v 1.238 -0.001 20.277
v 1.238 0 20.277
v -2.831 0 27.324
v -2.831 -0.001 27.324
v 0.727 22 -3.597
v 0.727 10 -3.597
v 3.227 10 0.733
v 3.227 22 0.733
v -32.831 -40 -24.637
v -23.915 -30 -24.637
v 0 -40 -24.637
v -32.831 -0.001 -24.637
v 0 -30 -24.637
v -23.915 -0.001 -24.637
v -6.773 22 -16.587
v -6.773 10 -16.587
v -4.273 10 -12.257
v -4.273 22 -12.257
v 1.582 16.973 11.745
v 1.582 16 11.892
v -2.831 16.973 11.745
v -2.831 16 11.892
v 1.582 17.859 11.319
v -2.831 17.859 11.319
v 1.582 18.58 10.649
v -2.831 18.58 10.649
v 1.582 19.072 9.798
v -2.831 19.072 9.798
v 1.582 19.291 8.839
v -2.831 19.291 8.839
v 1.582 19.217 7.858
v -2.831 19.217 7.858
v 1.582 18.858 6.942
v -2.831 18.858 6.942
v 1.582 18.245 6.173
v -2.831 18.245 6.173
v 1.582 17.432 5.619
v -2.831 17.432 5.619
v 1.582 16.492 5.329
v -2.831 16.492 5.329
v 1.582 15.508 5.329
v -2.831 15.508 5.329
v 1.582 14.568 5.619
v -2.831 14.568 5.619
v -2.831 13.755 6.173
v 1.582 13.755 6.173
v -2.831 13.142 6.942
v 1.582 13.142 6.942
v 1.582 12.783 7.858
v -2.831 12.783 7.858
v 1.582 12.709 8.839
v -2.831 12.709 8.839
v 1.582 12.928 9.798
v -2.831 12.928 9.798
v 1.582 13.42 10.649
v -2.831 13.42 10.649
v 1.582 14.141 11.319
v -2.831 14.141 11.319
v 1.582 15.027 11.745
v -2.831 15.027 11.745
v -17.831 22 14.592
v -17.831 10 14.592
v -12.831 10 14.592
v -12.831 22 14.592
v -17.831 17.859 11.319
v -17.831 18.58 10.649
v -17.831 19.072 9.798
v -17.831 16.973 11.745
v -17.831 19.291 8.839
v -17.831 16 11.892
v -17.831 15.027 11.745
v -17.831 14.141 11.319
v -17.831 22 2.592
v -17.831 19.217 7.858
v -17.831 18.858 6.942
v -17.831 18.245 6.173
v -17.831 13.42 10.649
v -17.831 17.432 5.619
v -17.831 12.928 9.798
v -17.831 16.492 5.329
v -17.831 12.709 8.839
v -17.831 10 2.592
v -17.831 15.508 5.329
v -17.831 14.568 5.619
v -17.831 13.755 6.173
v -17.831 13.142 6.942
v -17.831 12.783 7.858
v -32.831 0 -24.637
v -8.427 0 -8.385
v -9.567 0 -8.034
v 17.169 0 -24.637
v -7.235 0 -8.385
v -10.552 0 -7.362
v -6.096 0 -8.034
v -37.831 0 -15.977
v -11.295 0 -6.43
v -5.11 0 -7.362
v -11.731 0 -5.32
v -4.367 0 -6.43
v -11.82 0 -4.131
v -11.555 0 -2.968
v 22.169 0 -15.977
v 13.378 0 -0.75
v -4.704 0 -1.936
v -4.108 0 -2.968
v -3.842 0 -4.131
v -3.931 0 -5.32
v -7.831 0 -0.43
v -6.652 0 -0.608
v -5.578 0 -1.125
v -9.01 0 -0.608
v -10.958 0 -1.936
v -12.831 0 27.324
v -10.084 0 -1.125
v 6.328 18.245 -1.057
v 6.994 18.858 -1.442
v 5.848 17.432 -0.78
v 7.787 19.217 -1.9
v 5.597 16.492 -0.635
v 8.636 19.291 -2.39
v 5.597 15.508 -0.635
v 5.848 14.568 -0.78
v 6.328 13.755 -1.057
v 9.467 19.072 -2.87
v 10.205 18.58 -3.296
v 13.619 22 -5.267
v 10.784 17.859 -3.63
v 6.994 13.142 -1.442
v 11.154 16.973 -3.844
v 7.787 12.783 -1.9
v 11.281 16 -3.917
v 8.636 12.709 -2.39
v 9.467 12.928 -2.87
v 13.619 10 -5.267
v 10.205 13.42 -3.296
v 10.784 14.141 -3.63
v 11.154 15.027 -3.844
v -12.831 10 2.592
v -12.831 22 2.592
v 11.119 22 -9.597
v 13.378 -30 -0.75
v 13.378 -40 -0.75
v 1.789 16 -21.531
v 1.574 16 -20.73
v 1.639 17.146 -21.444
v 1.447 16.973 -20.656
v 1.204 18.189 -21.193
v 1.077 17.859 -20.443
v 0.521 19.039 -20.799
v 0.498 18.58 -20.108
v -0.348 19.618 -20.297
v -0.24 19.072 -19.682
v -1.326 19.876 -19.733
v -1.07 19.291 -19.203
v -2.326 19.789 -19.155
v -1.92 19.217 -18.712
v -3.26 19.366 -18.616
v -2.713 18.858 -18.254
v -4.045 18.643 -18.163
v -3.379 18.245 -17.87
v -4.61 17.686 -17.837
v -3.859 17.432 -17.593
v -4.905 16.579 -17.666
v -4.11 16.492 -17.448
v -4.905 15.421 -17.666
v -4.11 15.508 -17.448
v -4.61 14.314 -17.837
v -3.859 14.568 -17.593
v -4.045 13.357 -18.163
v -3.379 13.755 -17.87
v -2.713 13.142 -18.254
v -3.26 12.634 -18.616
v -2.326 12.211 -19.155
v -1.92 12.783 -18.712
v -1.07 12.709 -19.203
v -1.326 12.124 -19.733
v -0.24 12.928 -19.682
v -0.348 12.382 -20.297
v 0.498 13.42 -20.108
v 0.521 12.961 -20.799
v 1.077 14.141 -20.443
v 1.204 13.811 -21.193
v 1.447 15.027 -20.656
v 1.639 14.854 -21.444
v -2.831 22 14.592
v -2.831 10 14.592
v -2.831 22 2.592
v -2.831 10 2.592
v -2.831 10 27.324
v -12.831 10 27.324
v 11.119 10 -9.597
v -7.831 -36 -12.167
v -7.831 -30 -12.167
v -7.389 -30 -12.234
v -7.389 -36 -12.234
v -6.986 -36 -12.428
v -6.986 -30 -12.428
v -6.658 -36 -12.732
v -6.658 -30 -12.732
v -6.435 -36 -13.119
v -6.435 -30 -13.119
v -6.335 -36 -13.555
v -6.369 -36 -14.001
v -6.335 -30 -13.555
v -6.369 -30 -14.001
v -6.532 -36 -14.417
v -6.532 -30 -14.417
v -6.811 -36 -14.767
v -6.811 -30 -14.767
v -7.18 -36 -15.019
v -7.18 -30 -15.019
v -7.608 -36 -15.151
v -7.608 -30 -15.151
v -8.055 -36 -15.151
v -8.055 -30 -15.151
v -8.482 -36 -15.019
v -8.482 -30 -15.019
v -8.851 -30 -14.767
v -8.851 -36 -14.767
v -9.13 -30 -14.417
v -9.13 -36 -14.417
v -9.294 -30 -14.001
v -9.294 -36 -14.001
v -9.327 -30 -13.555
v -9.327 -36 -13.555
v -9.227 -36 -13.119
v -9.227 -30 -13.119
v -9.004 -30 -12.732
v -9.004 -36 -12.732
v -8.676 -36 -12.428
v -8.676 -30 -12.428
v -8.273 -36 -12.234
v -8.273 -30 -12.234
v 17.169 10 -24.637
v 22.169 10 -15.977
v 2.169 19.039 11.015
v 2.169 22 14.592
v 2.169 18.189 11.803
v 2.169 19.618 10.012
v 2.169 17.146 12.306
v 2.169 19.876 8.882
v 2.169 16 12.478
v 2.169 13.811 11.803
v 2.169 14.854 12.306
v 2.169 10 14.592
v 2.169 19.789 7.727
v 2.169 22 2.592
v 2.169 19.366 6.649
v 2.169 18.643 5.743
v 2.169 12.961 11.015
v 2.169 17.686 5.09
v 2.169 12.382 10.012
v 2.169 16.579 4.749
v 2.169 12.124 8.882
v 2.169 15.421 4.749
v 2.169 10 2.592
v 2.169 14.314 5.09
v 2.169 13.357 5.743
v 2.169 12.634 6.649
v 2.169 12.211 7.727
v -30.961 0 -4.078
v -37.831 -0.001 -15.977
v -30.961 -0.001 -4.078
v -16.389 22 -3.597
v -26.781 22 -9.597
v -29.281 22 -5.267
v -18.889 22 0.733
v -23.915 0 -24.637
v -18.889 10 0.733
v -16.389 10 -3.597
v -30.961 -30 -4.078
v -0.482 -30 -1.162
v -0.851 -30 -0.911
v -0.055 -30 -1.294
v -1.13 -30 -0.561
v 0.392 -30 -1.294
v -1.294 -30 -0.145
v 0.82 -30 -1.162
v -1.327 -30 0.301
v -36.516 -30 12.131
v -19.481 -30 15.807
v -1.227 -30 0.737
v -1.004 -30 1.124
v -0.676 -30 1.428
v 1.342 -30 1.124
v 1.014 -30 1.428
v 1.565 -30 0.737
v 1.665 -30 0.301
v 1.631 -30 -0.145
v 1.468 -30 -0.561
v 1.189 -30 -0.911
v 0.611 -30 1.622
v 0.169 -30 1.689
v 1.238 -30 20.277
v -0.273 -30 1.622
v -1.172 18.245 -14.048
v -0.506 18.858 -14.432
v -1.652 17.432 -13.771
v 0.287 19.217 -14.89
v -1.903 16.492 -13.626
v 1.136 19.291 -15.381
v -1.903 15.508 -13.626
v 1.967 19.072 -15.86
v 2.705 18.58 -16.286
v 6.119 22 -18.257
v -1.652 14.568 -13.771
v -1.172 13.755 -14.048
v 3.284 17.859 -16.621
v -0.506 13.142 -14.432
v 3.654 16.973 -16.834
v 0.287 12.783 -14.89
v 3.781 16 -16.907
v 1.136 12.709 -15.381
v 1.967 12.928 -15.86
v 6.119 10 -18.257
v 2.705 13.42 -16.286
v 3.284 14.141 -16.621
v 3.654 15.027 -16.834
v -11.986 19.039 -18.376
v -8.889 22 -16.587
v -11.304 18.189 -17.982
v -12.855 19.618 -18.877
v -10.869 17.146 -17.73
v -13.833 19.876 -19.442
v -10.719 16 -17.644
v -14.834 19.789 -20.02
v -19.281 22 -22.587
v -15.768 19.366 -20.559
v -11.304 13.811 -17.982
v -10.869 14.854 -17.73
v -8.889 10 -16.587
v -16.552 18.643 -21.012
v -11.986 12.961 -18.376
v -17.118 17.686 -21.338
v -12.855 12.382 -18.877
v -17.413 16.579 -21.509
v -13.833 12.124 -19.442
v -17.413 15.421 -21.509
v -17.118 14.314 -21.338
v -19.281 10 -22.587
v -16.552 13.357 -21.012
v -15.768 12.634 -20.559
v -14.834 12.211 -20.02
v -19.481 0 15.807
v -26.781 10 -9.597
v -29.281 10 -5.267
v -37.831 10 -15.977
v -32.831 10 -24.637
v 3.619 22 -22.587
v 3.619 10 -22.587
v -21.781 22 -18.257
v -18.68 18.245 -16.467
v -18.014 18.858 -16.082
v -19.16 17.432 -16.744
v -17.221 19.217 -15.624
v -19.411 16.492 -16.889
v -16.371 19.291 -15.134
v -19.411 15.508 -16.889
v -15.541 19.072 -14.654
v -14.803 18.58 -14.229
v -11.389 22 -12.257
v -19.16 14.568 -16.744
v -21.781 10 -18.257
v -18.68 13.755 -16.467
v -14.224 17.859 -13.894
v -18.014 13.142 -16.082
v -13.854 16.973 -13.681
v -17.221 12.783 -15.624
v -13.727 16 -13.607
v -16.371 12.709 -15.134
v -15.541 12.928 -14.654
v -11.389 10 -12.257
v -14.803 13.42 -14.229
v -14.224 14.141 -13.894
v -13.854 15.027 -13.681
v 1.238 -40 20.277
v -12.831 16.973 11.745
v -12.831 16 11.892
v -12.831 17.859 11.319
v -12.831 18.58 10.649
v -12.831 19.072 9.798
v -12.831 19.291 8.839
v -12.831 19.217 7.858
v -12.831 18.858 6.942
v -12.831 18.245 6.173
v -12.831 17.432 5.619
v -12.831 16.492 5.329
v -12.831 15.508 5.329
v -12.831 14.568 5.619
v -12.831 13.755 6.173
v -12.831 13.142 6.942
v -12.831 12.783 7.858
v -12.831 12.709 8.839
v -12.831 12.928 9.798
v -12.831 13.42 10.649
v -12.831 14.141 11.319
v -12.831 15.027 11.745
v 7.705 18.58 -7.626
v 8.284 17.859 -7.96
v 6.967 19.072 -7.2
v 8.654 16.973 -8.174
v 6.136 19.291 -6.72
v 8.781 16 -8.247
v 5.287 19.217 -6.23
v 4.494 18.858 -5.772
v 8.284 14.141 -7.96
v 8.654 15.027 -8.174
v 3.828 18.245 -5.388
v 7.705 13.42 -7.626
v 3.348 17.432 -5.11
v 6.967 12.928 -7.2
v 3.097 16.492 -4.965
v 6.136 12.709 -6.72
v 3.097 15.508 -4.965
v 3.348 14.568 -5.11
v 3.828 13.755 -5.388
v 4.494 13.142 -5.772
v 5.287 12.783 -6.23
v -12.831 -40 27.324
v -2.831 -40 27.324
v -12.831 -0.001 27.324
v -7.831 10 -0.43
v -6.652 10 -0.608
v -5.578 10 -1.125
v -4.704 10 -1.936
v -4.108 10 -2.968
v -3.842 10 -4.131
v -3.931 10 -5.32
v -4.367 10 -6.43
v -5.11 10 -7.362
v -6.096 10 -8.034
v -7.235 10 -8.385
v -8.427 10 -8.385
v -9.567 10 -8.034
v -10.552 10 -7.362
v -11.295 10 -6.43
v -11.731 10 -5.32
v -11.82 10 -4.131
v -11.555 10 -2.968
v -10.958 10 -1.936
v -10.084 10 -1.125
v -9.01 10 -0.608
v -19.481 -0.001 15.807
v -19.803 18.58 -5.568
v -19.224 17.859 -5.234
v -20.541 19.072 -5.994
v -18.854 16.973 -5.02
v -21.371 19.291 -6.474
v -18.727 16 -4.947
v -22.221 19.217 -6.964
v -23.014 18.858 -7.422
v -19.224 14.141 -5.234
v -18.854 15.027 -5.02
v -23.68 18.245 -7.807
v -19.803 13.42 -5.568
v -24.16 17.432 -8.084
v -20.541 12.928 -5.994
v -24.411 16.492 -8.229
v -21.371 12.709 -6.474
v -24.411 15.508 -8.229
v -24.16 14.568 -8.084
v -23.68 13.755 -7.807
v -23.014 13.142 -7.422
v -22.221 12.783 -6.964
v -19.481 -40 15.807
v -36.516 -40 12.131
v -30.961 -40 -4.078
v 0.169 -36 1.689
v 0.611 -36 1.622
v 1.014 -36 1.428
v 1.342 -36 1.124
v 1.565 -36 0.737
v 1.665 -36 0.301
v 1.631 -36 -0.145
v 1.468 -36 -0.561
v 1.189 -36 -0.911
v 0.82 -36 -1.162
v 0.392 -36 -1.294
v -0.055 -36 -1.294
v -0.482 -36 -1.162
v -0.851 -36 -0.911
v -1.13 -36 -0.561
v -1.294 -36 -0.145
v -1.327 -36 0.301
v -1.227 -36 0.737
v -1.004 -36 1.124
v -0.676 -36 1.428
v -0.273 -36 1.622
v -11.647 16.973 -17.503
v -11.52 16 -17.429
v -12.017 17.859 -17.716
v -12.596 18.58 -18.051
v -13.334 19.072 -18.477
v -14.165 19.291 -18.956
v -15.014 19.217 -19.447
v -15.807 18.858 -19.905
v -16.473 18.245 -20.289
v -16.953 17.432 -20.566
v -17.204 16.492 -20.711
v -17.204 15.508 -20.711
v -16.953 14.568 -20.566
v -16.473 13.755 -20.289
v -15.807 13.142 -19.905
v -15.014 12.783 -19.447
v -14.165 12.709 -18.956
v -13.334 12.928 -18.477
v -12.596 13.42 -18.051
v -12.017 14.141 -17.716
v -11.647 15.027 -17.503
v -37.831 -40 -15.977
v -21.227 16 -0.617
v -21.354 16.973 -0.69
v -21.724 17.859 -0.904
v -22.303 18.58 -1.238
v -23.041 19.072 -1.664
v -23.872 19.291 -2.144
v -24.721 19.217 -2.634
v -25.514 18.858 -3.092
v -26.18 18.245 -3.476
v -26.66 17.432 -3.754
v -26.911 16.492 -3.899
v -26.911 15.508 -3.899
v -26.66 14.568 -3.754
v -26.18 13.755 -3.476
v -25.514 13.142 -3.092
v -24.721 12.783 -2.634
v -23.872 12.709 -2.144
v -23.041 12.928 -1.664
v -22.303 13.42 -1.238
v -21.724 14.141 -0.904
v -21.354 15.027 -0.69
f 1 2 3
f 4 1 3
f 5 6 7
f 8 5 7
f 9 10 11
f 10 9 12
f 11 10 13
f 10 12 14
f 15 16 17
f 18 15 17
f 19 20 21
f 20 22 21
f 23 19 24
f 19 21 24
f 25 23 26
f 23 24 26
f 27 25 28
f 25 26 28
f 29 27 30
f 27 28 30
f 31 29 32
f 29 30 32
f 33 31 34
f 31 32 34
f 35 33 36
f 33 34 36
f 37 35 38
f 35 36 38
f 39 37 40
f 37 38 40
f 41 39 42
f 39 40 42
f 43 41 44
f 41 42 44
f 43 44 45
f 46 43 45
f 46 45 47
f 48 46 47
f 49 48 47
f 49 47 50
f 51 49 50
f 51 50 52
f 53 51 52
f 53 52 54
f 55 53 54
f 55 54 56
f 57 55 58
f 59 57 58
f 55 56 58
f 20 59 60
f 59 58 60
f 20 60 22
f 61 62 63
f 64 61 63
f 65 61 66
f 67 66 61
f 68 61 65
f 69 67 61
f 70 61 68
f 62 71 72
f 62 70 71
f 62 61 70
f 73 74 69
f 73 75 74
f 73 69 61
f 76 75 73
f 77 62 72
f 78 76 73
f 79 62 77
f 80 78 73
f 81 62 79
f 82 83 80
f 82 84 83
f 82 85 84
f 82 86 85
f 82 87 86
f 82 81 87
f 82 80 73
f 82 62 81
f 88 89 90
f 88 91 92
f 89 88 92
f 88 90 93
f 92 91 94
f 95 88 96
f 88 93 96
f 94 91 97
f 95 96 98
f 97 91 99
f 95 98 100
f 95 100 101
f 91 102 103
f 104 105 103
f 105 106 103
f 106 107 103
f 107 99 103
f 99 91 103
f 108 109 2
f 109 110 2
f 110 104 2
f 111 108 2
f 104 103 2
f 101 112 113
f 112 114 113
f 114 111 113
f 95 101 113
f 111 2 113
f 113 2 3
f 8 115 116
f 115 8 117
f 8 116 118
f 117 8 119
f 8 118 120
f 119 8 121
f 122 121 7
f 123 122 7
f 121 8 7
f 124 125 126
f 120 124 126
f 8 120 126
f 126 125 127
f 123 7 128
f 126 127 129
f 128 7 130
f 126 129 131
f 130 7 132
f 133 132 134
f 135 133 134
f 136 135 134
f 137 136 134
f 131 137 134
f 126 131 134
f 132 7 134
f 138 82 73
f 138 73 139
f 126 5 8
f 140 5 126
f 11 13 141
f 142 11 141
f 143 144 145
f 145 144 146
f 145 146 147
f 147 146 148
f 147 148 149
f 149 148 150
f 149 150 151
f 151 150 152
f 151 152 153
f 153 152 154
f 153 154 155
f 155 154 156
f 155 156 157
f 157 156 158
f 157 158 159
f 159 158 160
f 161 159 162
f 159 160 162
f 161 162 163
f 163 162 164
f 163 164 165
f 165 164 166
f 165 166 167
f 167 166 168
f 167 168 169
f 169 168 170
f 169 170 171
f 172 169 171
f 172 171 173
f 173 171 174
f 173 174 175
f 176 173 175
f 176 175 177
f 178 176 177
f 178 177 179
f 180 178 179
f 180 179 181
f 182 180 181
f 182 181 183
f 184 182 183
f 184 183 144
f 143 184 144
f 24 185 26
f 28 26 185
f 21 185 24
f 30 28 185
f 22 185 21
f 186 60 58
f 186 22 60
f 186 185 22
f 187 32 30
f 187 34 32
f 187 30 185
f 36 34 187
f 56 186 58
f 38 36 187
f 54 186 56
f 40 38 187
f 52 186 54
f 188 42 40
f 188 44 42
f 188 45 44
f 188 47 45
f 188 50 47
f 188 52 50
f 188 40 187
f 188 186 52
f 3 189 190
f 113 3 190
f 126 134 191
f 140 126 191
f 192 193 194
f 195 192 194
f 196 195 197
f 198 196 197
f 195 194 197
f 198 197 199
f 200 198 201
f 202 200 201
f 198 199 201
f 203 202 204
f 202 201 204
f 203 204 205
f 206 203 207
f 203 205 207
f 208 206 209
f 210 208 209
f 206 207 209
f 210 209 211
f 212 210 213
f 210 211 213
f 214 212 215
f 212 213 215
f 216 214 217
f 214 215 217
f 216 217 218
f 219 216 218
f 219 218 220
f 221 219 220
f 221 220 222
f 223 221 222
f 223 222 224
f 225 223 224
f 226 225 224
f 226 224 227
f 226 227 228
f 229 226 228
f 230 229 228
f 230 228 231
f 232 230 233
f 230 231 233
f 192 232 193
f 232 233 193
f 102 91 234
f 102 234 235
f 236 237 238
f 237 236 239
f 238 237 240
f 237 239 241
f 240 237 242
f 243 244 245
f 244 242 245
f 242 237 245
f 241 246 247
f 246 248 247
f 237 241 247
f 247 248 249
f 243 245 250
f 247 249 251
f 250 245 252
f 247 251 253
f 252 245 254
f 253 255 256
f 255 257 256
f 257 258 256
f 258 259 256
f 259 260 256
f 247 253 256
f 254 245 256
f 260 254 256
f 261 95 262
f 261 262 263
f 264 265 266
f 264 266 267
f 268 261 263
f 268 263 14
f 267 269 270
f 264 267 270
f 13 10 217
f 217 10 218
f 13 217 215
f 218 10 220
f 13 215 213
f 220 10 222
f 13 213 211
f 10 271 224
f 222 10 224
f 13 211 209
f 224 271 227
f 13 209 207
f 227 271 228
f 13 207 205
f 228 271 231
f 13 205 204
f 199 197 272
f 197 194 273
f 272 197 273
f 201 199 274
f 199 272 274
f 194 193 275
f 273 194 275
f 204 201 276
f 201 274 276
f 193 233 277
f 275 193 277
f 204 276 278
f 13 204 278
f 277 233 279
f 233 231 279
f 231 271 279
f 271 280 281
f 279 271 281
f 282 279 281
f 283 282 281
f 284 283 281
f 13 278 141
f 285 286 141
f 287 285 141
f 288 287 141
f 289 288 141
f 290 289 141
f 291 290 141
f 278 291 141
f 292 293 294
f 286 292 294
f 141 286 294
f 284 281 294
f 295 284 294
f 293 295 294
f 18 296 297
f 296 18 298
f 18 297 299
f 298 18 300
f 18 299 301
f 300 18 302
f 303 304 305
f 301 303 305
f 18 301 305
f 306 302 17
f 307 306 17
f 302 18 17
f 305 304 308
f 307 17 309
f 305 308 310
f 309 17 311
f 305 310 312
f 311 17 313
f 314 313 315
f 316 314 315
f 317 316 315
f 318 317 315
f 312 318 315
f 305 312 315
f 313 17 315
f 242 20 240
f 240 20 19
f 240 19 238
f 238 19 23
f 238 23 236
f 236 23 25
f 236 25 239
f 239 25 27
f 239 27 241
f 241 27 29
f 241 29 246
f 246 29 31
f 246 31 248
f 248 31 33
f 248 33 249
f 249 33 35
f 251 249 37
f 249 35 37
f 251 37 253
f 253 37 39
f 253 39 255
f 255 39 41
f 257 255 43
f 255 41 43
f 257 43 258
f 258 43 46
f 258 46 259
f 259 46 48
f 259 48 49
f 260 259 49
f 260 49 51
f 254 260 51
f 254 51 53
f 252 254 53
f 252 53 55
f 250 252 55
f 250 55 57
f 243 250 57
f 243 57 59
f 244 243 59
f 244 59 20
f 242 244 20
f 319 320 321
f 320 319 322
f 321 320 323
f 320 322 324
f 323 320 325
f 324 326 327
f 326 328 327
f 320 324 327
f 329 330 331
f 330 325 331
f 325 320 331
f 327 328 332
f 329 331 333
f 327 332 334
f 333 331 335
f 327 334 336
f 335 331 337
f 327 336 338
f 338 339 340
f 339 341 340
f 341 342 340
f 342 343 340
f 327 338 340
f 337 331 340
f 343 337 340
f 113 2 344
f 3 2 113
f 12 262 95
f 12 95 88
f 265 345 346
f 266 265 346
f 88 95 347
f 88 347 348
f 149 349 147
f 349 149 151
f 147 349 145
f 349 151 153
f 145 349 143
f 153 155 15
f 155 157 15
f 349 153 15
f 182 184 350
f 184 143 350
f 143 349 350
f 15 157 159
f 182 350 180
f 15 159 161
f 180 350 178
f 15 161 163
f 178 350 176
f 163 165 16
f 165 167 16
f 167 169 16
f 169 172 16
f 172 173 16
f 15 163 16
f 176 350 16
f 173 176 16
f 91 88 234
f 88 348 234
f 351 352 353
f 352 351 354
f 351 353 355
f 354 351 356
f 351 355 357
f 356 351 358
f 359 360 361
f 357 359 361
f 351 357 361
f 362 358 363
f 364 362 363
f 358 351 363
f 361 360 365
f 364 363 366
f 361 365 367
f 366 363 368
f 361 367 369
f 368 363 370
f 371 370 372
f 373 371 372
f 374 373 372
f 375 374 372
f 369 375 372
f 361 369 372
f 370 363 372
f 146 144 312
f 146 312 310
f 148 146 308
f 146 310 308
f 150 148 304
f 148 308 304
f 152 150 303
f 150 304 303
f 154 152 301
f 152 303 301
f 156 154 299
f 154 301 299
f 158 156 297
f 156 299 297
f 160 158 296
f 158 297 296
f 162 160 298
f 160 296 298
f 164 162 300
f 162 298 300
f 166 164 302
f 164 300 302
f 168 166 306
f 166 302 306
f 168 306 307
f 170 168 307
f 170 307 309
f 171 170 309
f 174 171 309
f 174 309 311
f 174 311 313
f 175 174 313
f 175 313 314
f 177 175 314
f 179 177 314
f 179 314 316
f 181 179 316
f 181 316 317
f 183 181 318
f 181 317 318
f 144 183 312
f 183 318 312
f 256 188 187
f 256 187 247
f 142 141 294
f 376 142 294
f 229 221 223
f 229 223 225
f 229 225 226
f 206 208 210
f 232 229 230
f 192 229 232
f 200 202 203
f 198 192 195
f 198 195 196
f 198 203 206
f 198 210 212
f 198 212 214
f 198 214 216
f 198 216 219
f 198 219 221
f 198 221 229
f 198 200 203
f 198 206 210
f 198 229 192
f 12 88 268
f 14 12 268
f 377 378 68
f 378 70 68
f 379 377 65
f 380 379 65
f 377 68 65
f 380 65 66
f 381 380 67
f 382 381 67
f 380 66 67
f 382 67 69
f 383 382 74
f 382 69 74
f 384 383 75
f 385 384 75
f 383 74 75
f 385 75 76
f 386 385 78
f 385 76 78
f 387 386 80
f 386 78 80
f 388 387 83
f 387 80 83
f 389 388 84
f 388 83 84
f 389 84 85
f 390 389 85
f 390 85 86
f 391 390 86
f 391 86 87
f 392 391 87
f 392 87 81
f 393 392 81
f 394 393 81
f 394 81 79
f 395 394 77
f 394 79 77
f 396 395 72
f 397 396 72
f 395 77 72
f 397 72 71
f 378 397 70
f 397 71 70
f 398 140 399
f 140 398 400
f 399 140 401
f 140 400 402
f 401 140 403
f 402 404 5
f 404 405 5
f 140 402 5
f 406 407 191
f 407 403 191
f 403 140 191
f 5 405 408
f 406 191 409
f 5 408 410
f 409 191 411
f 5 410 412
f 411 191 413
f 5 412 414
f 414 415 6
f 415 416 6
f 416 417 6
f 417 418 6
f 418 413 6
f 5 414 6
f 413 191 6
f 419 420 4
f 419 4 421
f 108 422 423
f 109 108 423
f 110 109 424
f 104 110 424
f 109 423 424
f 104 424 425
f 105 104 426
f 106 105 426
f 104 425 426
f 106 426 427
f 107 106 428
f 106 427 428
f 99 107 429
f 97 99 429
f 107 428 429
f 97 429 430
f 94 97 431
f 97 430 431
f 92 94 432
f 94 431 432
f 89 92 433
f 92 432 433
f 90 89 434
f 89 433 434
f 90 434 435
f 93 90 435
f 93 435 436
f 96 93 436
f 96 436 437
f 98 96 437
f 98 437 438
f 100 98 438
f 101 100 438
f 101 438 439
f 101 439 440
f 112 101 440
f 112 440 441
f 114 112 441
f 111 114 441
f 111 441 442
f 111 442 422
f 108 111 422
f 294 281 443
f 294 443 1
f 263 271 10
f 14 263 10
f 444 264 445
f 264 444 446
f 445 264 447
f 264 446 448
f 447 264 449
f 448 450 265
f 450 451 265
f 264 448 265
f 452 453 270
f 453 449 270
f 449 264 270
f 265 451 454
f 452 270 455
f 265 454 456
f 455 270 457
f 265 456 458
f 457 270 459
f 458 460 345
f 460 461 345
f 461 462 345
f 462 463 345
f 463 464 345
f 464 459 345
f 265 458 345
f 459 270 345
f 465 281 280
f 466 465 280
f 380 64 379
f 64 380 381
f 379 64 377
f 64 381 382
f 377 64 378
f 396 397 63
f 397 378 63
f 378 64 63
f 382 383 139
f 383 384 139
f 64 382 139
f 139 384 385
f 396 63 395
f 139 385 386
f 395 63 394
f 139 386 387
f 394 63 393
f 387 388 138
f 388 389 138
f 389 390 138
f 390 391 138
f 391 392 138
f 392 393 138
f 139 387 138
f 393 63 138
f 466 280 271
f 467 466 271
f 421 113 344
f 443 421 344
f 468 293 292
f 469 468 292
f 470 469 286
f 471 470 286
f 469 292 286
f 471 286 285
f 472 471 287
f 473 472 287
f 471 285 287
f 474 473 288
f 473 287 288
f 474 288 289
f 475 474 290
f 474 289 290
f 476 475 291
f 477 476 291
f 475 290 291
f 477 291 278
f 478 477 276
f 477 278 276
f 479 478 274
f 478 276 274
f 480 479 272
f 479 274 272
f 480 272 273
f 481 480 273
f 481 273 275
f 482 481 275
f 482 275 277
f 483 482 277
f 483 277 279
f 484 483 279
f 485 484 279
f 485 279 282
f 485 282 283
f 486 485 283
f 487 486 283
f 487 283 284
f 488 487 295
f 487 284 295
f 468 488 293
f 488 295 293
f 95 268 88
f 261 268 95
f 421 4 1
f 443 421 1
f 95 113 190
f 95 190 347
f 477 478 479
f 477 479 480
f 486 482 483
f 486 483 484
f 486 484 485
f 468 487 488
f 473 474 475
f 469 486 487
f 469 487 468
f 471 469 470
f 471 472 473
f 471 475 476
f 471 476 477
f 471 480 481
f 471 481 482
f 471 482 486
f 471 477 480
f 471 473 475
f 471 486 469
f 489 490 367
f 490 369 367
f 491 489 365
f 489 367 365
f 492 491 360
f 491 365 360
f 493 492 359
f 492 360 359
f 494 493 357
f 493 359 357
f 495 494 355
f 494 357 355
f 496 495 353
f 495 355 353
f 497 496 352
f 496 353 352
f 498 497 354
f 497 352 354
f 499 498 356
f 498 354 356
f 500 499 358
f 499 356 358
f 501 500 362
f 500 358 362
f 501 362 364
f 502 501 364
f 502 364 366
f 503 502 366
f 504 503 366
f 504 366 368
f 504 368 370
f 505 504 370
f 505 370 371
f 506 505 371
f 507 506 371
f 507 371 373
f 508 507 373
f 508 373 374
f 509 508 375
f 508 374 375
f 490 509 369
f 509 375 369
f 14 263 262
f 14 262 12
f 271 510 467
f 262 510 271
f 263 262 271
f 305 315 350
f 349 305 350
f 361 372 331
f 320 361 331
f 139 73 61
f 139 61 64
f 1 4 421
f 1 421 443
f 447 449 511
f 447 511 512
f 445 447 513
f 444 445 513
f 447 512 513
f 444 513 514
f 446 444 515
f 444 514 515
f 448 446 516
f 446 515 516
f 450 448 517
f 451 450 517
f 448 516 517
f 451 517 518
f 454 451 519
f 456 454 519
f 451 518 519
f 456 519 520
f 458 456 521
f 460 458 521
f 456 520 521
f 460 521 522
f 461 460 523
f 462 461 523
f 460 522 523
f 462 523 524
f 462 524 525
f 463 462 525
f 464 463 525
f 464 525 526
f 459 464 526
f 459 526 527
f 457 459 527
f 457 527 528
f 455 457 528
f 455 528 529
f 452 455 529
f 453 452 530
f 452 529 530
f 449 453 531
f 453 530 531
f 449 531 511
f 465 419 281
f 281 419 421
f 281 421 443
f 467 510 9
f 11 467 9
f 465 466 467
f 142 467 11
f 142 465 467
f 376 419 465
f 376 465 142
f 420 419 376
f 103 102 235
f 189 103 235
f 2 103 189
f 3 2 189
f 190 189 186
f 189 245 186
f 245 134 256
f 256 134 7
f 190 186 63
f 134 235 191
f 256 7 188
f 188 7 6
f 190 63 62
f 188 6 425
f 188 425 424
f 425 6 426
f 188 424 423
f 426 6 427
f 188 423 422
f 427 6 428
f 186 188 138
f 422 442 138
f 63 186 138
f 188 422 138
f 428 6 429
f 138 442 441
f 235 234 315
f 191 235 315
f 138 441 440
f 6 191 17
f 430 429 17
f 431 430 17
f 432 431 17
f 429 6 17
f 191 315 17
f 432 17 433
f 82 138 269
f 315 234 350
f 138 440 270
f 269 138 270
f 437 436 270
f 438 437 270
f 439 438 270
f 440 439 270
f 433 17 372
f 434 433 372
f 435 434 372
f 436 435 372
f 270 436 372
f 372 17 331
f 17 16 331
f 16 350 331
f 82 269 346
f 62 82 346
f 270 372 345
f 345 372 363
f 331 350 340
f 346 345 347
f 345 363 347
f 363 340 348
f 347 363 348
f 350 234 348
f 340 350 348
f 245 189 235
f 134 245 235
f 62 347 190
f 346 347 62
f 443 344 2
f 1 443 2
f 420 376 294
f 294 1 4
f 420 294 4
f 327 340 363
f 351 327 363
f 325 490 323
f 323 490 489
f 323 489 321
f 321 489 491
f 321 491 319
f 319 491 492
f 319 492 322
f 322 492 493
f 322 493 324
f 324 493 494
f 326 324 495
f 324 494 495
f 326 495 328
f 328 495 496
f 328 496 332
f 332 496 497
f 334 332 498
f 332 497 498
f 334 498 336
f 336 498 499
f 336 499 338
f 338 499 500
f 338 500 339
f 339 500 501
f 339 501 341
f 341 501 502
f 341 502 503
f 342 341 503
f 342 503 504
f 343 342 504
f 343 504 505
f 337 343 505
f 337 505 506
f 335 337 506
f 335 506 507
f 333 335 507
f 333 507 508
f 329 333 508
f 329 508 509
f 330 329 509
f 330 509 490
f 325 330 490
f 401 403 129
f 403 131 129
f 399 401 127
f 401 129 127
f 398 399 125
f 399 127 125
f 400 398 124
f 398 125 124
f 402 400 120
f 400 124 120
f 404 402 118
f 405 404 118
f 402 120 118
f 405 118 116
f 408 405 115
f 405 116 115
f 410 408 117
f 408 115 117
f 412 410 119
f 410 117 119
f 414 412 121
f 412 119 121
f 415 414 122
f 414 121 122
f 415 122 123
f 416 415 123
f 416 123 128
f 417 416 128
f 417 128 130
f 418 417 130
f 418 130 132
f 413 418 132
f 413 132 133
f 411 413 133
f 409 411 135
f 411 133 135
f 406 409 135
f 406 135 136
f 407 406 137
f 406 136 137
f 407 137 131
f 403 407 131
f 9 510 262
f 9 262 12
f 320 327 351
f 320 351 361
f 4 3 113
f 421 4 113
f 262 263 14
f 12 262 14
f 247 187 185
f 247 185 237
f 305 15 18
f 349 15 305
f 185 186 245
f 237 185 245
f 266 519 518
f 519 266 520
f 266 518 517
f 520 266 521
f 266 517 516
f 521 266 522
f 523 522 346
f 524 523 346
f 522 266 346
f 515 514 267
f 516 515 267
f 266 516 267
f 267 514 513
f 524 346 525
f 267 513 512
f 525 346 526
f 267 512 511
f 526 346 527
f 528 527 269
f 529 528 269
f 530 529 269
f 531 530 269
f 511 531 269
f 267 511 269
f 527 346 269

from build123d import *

# Parameters (mm, degrees)
EXTRUDE_1_DEPTH                 = 10
SKETCH_2_W                      = 5
SKETCH_2_H                      = 12
EXTRUDE_4_DEPTH                 = 12
HOLE_WIZARD_G1_16_1_D           = 6.6
HOLE_WIZARD_G1_16_1_DEPTH       = 50
HOLE_WIZARD_G1_16_1_CSINK_D     = 7.773
HOLE_WIZARD_G1_16_1_CSINK_ANGLE = 90
HOLE_WIZARD_G1_16_1_TIP         = 1.982840043
HOLE_WIZARD_G1_16_2_D           = 6.6
HOLE_WIZARD_G1_16_2_DEPTH       = 50
HOLE_WIZARD_G1_16_2_CSINK_D     = 7.773
HOLE_WIZARD_G1_16_2_CSINK_ANGLE = 90
HOLE_WIZARD_G1_16_2_TIP         = 1.982840043
HOLE_WIZARD_G1_16_3_D           = 6.6
HOLE_WIZARD_G1_16_3_DEPTH       = 50
HOLE_WIZARD_G1_16_3_CSINK_D     = 7.773
HOLE_WIZARD_G1_16_3_CSINK_ANGLE = 90
HOLE_WIZARD_G1_16_3_TIP         = 1.982840043
EXTRUDE_5_DEPTH                 = 40
SKETCH_19_W                     = 50
SKETCH_19_H                     = 30
CUT_EXTRUDE_2_DEPTH             = 74
EXTRUDE_6_DEPTH                 = 40
SKETCH_23_R                     = 1.5
CUT_EXTRUDE_3_DEPTH             = 6
SKETCH_24_R                     = 4
CUT_EXTRUDE_4_DEPTH             = 14
SPLIT_BODIES_1_SURFACE_1_BACK   = 101.717
SPLIT_BODIES_1_SURFACE_1_DEPTH  = 203.434
SPLIT_BODIES_1_SURFACE_2_BACK   = 101.717
SPLIT_BODIES_1_SURFACE_2_DEPTH  = 203.434


with BuildPart() as part:
    # 草图1 → 凸台-拉伸1 (new body)
    with BuildSketch(Plane(origin=(0, 0, 0), x_dir=(1, 0, 0), z_dir=(0, 1, 0))):
        Polygon((-32.831152269, 24.637065757), (17.168847731, 24.637065757), (22.168847731, 15.976811719), (-2.831152269, -27.32445847), (-12.831152269, -27.32445847), (-37.831152269, 15.976811719), align=None)
    extrude(amount=EXTRUDE_1_DEPTH)

    # 草图2 → 凸台-拉伸4 (add)
    with BuildSketch(Plane(origin=(0, 10, 0), x_dir=(1, 0, 0), z_dir=(0, 1, 0))):
        Polygon((-18.888926711, -0.733069557), (-16.388914662, 3.597050504), (-26.78120281, 9.597079424), (-29.28121486, 5.266959362), align=None)
        Polygon((-11.388890562, 12.257290628), (-8.888878512, 16.58741069), (-19.28116666, 22.58743961), (-21.78117871, 18.257319548), align=None)
        Polygon((-4.273413977, 12.257290628), (6.118874171, 18.257319548), (3.618862121, 22.58743961), (-6.773426027, 16.58741069), align=None)
        Polygon((3.226622172, -0.733069557), (13.618910321, 5.266959362), (11.118898271, 9.597079424), (0.726610123, 3.597050504), align=None)
        with Locations((-0.331152269, -8.591935763)):
            Rectangle(SKETCH_2_W, SKETCH_2_H)
        with Locations((-15.331152269, -8.591935763)):
            Rectangle(SKETCH_2_W, SKETCH_2_H)
    extrude(amount=EXTRUDE_4_DEPTH)

    # G1/16 螺纹孔1
    with Locations(Plane(origin=(4.96034155, 0, -8.591508373), x_dir=(-0.8660240123793532, 0, -0.500002409976558), z_dir=(0.500002409976558, 0, -0.8660240123793532))):
        with Locations((21.991727555, 16)):
            CounterSinkHole(HOLE_WIZARD_G1_16_1_D / 2, HOLE_WIZARD_G1_16_1_CSINK_D / 2, depth=HOLE_WIZARD_G1_16_1_DEPTH, counter_sink_angle=HOLE_WIZARD_G1_16_1_CSINK_ANGLE)
            with Locations((0, 0, -(HOLE_WIZARD_G1_16_1_DEPTH + HOLE_WIZARD_G1_16_1_TIP / 2))):  # 118° drill point
                Cone(0, HOLE_WIZARD_G1_16_1_D / 2, HOLE_WIZARD_G1_16_1_TIP, mode=Mode.SUBTRACT)

    # G1/16 螺纹孔2
    with Locations(Plane(origin=(-8.875955431, 0, -15.373506972), x_dir=(-0.8660240123793504, 0, 0.5000024099765628), z_dir=(-0.5000024099765628, 0, -0.8660240123793506))):
        with Locations((-8.427795735, 16)):
            CounterSinkHole(HOLE_WIZARD_G1_16_2_D / 2, HOLE_WIZARD_G1_16_2_CSINK_D / 2, depth=HOLE_WIZARD_G1_16_2_DEPTH, counter_sink_angle=HOLE_WIZARD_G1_16_2_CSINK_ANGLE)
            with Locations((0, 0, -(HOLE_WIZARD_G1_16_2_DEPTH + HOLE_WIZARD_G1_16_2_TIP / 2))):  # 118° drill point
                Cone(0, HOLE_WIZARD_G1_16_2_D / 2, HOLE_WIZARD_G1_16_2_TIP, mode=Mode.SUBTRACT)

    # G1/16 螺纹孔3
    with Locations(Plane(origin=(2.168847731, 0, 0), x_dir=(0, 0, -1), z_dir=(1, 0, 0))):
        with Locations((-8.591935763, 16)):
            CounterSinkHole(HOLE_WIZARD_G1_16_3_D / 2, HOLE_WIZARD_G1_16_3_CSINK_D / 2, depth=HOLE_WIZARD_G1_16_3_DEPTH, counter_sink_angle=HOLE_WIZARD_G1_16_3_CSINK_ANGLE)
            with Locations((0, 0, -(HOLE_WIZARD_G1_16_3_DEPTH + HOLE_WIZARD_G1_16_3_TIP / 2))):  # 118° drill point
                Cone(0, HOLE_WIZARD_G1_16_3_D / 2, HOLE_WIZARD_G1_16_3_TIP, mode=Mode.SUBTRACT)

    # 草图18 → 凸台-拉伸5 (add)
    with BuildSketch(Plane(origin=(0, 0, 0), x_dir=(-1, 0, 0), z_dir=(0, -1, 0))):
        Polygon((36.516059441, -12.131432542), (30.961139109, 4.077599876), (19.480871434, -15.806807021), align=None)
        Polygon((30.961139109, 4.077599876), (23.915302437, 24.637065757), (-1.237762159, -20.276891949), (19.480871434, -15.806807021), align=None)
        Polygon((23.915302437, 24.637065757), (0, 24.637065757), (-13.377530598, 0.749803781), (-1.237762159, -20.276891949), align=None)
    extrude(amount=EXTRUDE_5_DEPTH)

    # 草图19 → 切除-拉伸2 (cut)
    with BuildSketch(Plane(origin=(-4.125141126, 0, 19.119835281), x_dir=(0.9775078175150543, 0, 0.21089918609837094), z_dir=(-0.21089918609837097, 0, 0.9775078175150544))):
        with Locations((-8.136224319, -15)):
            Rectangle(SKETCH_19_W, SKETCH_19_H)
    extrude(amount=-CUT_EXTRUDE_2_DEPTH, mode=Mode.SUBTRACT)


with BuildPart() as cut_extrude_2_piece_1:
    # of the separate pieces the step leaves, piece 1, a body of its own (cut_extrude_2_pieces)
    add(part.part.solids().sort_by_distance((17.168847731, 0, -24.637065757))[0])



with BuildPart() as cut_extrude_2_piece_2:
    # of the separate pieces the step leaves, piece 2, a body of its own (cut_extrude_2_pieces)
    add(part.part.solids().sort_by_distance((-23.915302437, -30, -24.637065757))[0])


with BuildPart() as cut_extrude_2_piece_1_1:
    add(cut_extrude_2_piece_1.part)

    add(cut_extrude_2_piece_2.part)  # 凸台-拉伸6 merges 切除-拉伸2 piece 2
    # 草图20 → 凸台-拉伸6 (add)
    with BuildSketch(Plane.XZ):
        Polygon((-12.831152269, 27.32445847), (-19.480871434, 15.806807021), (1.237762159, 20.276891949), (-2.831152269, 27.32445847), align=None)
        Polygon((-37.831152269, -15.976811719), (-30.961139109, -4.077599876), (-23.915302437, -24.637065757), (-32.831152269, -24.637065757), align=None)
    extrude(amount=EXTRUDE_6_DEPTH)

    # 草图23 → 切除-拉伸3 (cut)
    with BuildSketch(Plane(origin=(0, -30, 0), x_dir=(1, 0, 0), z_dir=(0, 1, 0))):
        with Locations(Location((0.168847731, -0.188995818, 0), (0, 0, 270))):
            Circle(SKETCH_23_R)
        with Locations(Location((-7.831152269, 13.667410642, 0), (0, 0, 270))):
            Circle(SKETCH_23_R)
    extrude(amount=-CUT_EXTRUDE_3_DEPTH, mode=Mode.SUBTRACT)

    # 草图24 → 切除-拉伸4 (cut)
    with BuildSketch(Plane(origin=(0, 10, 0), x_dir=(1, 0, 0), z_dir=(0, 1, 0))):
        with Locations(Location((-7.831152269, 4.429806335, 0), (0, 0, 270))):
            Circle(SKETCH_24_R)
    extrude(amount=-CUT_EXTRUDE_4_DEPTH, mode=Mode.SUBTRACT)


with BuildPart() as body_2:
    # Split Bodies 1: the piece behind the surface
    add(cut_extrude_2_piece_1_1.part)
    # Split Bodies 1 surface: a surface, the sketch's curves swept straight by 203.434 mm
    with BuildLine(Plane(origin=(-35.291526612, 0, -20.37557239), x_dir=(-0.4999999999999961, 0, 0.866025403784441), z_dir=(-0.866025403784441, 0, -0.4999999999999961)).offset(-SPLIT_BODIES_1_SURFACE_1_BACK), mode=Mode.PRIVATE) as split_bodies_1_surface_1_path:
        Line((-9.378673602, 0), (48.060747663, 0))
        Line((48.060747663, 0), (48.060747663, -0.001))
        Line((48.060747663, -0.001), (-9.378673602, -0.001))
        Line((-9.378673602, -0.001), (-9.378673602, 0))
    split_bodies_1_surface_1 = Shell.extrude(split_bodies_1_surface_1_path.wire(), (-0.866025404 * SPLIT_BODIES_1_SURFACE_1_DEPTH, 0 * SPLIT_BODIES_1_SURFACE_1_DEPTH, -0.5 * SPLIT_BODIES_1_SURFACE_1_DEPTH))
    split(bisect_by=split_bodies_1_surface_1, keep=Keep.BOTTOM)


with BuildPart() as cut_extrude_2_piece_1_2:
    add(cut_extrude_2_piece_1_1.part)

    # Split Bodies 1: split by a surface, the side it looks to stays
    # Split Bodies 1 surface: a surface, the sketch's curves swept straight by 203.434 mm
    with BuildLine(Plane(origin=(-35.291526612, 0, -20.37557239), x_dir=(-0.4999999999999961, 0, 0.866025403784441), z_dir=(-0.866025403784441, 0, -0.4999999999999961)).offset(-SPLIT_BODIES_1_SURFACE_2_BACK), mode=Mode.PRIVATE) as split_bodies_1_surface_2_path:
        Line((-9.378673602, 0), (48.060747663, 0))
        Line((48.060747663, 0), (48.060747663, -0.001))
        Line((48.060747663, -0.001), (-9.378673602, -0.001))
        Line((-9.378673602, -0.001), (-9.378673602, 0))
    split_bodies_1_surface_2 = Shell.extrude(split_bodies_1_surface_2_path.wire(), (-0.866025404 * SPLIT_BODIES_1_SURFACE_2_DEPTH, 0 * SPLIT_BODIES_1_SURFACE_2_DEPTH, -0.5 * SPLIT_BODIES_1_SURFACE_2_DEPTH))
    split(bisect_by=split_bodies_1_surface_2, keep=Keep.TOP)


solid = Compound([body_2.part, cut_extrude_2_piece_1_2.part])
